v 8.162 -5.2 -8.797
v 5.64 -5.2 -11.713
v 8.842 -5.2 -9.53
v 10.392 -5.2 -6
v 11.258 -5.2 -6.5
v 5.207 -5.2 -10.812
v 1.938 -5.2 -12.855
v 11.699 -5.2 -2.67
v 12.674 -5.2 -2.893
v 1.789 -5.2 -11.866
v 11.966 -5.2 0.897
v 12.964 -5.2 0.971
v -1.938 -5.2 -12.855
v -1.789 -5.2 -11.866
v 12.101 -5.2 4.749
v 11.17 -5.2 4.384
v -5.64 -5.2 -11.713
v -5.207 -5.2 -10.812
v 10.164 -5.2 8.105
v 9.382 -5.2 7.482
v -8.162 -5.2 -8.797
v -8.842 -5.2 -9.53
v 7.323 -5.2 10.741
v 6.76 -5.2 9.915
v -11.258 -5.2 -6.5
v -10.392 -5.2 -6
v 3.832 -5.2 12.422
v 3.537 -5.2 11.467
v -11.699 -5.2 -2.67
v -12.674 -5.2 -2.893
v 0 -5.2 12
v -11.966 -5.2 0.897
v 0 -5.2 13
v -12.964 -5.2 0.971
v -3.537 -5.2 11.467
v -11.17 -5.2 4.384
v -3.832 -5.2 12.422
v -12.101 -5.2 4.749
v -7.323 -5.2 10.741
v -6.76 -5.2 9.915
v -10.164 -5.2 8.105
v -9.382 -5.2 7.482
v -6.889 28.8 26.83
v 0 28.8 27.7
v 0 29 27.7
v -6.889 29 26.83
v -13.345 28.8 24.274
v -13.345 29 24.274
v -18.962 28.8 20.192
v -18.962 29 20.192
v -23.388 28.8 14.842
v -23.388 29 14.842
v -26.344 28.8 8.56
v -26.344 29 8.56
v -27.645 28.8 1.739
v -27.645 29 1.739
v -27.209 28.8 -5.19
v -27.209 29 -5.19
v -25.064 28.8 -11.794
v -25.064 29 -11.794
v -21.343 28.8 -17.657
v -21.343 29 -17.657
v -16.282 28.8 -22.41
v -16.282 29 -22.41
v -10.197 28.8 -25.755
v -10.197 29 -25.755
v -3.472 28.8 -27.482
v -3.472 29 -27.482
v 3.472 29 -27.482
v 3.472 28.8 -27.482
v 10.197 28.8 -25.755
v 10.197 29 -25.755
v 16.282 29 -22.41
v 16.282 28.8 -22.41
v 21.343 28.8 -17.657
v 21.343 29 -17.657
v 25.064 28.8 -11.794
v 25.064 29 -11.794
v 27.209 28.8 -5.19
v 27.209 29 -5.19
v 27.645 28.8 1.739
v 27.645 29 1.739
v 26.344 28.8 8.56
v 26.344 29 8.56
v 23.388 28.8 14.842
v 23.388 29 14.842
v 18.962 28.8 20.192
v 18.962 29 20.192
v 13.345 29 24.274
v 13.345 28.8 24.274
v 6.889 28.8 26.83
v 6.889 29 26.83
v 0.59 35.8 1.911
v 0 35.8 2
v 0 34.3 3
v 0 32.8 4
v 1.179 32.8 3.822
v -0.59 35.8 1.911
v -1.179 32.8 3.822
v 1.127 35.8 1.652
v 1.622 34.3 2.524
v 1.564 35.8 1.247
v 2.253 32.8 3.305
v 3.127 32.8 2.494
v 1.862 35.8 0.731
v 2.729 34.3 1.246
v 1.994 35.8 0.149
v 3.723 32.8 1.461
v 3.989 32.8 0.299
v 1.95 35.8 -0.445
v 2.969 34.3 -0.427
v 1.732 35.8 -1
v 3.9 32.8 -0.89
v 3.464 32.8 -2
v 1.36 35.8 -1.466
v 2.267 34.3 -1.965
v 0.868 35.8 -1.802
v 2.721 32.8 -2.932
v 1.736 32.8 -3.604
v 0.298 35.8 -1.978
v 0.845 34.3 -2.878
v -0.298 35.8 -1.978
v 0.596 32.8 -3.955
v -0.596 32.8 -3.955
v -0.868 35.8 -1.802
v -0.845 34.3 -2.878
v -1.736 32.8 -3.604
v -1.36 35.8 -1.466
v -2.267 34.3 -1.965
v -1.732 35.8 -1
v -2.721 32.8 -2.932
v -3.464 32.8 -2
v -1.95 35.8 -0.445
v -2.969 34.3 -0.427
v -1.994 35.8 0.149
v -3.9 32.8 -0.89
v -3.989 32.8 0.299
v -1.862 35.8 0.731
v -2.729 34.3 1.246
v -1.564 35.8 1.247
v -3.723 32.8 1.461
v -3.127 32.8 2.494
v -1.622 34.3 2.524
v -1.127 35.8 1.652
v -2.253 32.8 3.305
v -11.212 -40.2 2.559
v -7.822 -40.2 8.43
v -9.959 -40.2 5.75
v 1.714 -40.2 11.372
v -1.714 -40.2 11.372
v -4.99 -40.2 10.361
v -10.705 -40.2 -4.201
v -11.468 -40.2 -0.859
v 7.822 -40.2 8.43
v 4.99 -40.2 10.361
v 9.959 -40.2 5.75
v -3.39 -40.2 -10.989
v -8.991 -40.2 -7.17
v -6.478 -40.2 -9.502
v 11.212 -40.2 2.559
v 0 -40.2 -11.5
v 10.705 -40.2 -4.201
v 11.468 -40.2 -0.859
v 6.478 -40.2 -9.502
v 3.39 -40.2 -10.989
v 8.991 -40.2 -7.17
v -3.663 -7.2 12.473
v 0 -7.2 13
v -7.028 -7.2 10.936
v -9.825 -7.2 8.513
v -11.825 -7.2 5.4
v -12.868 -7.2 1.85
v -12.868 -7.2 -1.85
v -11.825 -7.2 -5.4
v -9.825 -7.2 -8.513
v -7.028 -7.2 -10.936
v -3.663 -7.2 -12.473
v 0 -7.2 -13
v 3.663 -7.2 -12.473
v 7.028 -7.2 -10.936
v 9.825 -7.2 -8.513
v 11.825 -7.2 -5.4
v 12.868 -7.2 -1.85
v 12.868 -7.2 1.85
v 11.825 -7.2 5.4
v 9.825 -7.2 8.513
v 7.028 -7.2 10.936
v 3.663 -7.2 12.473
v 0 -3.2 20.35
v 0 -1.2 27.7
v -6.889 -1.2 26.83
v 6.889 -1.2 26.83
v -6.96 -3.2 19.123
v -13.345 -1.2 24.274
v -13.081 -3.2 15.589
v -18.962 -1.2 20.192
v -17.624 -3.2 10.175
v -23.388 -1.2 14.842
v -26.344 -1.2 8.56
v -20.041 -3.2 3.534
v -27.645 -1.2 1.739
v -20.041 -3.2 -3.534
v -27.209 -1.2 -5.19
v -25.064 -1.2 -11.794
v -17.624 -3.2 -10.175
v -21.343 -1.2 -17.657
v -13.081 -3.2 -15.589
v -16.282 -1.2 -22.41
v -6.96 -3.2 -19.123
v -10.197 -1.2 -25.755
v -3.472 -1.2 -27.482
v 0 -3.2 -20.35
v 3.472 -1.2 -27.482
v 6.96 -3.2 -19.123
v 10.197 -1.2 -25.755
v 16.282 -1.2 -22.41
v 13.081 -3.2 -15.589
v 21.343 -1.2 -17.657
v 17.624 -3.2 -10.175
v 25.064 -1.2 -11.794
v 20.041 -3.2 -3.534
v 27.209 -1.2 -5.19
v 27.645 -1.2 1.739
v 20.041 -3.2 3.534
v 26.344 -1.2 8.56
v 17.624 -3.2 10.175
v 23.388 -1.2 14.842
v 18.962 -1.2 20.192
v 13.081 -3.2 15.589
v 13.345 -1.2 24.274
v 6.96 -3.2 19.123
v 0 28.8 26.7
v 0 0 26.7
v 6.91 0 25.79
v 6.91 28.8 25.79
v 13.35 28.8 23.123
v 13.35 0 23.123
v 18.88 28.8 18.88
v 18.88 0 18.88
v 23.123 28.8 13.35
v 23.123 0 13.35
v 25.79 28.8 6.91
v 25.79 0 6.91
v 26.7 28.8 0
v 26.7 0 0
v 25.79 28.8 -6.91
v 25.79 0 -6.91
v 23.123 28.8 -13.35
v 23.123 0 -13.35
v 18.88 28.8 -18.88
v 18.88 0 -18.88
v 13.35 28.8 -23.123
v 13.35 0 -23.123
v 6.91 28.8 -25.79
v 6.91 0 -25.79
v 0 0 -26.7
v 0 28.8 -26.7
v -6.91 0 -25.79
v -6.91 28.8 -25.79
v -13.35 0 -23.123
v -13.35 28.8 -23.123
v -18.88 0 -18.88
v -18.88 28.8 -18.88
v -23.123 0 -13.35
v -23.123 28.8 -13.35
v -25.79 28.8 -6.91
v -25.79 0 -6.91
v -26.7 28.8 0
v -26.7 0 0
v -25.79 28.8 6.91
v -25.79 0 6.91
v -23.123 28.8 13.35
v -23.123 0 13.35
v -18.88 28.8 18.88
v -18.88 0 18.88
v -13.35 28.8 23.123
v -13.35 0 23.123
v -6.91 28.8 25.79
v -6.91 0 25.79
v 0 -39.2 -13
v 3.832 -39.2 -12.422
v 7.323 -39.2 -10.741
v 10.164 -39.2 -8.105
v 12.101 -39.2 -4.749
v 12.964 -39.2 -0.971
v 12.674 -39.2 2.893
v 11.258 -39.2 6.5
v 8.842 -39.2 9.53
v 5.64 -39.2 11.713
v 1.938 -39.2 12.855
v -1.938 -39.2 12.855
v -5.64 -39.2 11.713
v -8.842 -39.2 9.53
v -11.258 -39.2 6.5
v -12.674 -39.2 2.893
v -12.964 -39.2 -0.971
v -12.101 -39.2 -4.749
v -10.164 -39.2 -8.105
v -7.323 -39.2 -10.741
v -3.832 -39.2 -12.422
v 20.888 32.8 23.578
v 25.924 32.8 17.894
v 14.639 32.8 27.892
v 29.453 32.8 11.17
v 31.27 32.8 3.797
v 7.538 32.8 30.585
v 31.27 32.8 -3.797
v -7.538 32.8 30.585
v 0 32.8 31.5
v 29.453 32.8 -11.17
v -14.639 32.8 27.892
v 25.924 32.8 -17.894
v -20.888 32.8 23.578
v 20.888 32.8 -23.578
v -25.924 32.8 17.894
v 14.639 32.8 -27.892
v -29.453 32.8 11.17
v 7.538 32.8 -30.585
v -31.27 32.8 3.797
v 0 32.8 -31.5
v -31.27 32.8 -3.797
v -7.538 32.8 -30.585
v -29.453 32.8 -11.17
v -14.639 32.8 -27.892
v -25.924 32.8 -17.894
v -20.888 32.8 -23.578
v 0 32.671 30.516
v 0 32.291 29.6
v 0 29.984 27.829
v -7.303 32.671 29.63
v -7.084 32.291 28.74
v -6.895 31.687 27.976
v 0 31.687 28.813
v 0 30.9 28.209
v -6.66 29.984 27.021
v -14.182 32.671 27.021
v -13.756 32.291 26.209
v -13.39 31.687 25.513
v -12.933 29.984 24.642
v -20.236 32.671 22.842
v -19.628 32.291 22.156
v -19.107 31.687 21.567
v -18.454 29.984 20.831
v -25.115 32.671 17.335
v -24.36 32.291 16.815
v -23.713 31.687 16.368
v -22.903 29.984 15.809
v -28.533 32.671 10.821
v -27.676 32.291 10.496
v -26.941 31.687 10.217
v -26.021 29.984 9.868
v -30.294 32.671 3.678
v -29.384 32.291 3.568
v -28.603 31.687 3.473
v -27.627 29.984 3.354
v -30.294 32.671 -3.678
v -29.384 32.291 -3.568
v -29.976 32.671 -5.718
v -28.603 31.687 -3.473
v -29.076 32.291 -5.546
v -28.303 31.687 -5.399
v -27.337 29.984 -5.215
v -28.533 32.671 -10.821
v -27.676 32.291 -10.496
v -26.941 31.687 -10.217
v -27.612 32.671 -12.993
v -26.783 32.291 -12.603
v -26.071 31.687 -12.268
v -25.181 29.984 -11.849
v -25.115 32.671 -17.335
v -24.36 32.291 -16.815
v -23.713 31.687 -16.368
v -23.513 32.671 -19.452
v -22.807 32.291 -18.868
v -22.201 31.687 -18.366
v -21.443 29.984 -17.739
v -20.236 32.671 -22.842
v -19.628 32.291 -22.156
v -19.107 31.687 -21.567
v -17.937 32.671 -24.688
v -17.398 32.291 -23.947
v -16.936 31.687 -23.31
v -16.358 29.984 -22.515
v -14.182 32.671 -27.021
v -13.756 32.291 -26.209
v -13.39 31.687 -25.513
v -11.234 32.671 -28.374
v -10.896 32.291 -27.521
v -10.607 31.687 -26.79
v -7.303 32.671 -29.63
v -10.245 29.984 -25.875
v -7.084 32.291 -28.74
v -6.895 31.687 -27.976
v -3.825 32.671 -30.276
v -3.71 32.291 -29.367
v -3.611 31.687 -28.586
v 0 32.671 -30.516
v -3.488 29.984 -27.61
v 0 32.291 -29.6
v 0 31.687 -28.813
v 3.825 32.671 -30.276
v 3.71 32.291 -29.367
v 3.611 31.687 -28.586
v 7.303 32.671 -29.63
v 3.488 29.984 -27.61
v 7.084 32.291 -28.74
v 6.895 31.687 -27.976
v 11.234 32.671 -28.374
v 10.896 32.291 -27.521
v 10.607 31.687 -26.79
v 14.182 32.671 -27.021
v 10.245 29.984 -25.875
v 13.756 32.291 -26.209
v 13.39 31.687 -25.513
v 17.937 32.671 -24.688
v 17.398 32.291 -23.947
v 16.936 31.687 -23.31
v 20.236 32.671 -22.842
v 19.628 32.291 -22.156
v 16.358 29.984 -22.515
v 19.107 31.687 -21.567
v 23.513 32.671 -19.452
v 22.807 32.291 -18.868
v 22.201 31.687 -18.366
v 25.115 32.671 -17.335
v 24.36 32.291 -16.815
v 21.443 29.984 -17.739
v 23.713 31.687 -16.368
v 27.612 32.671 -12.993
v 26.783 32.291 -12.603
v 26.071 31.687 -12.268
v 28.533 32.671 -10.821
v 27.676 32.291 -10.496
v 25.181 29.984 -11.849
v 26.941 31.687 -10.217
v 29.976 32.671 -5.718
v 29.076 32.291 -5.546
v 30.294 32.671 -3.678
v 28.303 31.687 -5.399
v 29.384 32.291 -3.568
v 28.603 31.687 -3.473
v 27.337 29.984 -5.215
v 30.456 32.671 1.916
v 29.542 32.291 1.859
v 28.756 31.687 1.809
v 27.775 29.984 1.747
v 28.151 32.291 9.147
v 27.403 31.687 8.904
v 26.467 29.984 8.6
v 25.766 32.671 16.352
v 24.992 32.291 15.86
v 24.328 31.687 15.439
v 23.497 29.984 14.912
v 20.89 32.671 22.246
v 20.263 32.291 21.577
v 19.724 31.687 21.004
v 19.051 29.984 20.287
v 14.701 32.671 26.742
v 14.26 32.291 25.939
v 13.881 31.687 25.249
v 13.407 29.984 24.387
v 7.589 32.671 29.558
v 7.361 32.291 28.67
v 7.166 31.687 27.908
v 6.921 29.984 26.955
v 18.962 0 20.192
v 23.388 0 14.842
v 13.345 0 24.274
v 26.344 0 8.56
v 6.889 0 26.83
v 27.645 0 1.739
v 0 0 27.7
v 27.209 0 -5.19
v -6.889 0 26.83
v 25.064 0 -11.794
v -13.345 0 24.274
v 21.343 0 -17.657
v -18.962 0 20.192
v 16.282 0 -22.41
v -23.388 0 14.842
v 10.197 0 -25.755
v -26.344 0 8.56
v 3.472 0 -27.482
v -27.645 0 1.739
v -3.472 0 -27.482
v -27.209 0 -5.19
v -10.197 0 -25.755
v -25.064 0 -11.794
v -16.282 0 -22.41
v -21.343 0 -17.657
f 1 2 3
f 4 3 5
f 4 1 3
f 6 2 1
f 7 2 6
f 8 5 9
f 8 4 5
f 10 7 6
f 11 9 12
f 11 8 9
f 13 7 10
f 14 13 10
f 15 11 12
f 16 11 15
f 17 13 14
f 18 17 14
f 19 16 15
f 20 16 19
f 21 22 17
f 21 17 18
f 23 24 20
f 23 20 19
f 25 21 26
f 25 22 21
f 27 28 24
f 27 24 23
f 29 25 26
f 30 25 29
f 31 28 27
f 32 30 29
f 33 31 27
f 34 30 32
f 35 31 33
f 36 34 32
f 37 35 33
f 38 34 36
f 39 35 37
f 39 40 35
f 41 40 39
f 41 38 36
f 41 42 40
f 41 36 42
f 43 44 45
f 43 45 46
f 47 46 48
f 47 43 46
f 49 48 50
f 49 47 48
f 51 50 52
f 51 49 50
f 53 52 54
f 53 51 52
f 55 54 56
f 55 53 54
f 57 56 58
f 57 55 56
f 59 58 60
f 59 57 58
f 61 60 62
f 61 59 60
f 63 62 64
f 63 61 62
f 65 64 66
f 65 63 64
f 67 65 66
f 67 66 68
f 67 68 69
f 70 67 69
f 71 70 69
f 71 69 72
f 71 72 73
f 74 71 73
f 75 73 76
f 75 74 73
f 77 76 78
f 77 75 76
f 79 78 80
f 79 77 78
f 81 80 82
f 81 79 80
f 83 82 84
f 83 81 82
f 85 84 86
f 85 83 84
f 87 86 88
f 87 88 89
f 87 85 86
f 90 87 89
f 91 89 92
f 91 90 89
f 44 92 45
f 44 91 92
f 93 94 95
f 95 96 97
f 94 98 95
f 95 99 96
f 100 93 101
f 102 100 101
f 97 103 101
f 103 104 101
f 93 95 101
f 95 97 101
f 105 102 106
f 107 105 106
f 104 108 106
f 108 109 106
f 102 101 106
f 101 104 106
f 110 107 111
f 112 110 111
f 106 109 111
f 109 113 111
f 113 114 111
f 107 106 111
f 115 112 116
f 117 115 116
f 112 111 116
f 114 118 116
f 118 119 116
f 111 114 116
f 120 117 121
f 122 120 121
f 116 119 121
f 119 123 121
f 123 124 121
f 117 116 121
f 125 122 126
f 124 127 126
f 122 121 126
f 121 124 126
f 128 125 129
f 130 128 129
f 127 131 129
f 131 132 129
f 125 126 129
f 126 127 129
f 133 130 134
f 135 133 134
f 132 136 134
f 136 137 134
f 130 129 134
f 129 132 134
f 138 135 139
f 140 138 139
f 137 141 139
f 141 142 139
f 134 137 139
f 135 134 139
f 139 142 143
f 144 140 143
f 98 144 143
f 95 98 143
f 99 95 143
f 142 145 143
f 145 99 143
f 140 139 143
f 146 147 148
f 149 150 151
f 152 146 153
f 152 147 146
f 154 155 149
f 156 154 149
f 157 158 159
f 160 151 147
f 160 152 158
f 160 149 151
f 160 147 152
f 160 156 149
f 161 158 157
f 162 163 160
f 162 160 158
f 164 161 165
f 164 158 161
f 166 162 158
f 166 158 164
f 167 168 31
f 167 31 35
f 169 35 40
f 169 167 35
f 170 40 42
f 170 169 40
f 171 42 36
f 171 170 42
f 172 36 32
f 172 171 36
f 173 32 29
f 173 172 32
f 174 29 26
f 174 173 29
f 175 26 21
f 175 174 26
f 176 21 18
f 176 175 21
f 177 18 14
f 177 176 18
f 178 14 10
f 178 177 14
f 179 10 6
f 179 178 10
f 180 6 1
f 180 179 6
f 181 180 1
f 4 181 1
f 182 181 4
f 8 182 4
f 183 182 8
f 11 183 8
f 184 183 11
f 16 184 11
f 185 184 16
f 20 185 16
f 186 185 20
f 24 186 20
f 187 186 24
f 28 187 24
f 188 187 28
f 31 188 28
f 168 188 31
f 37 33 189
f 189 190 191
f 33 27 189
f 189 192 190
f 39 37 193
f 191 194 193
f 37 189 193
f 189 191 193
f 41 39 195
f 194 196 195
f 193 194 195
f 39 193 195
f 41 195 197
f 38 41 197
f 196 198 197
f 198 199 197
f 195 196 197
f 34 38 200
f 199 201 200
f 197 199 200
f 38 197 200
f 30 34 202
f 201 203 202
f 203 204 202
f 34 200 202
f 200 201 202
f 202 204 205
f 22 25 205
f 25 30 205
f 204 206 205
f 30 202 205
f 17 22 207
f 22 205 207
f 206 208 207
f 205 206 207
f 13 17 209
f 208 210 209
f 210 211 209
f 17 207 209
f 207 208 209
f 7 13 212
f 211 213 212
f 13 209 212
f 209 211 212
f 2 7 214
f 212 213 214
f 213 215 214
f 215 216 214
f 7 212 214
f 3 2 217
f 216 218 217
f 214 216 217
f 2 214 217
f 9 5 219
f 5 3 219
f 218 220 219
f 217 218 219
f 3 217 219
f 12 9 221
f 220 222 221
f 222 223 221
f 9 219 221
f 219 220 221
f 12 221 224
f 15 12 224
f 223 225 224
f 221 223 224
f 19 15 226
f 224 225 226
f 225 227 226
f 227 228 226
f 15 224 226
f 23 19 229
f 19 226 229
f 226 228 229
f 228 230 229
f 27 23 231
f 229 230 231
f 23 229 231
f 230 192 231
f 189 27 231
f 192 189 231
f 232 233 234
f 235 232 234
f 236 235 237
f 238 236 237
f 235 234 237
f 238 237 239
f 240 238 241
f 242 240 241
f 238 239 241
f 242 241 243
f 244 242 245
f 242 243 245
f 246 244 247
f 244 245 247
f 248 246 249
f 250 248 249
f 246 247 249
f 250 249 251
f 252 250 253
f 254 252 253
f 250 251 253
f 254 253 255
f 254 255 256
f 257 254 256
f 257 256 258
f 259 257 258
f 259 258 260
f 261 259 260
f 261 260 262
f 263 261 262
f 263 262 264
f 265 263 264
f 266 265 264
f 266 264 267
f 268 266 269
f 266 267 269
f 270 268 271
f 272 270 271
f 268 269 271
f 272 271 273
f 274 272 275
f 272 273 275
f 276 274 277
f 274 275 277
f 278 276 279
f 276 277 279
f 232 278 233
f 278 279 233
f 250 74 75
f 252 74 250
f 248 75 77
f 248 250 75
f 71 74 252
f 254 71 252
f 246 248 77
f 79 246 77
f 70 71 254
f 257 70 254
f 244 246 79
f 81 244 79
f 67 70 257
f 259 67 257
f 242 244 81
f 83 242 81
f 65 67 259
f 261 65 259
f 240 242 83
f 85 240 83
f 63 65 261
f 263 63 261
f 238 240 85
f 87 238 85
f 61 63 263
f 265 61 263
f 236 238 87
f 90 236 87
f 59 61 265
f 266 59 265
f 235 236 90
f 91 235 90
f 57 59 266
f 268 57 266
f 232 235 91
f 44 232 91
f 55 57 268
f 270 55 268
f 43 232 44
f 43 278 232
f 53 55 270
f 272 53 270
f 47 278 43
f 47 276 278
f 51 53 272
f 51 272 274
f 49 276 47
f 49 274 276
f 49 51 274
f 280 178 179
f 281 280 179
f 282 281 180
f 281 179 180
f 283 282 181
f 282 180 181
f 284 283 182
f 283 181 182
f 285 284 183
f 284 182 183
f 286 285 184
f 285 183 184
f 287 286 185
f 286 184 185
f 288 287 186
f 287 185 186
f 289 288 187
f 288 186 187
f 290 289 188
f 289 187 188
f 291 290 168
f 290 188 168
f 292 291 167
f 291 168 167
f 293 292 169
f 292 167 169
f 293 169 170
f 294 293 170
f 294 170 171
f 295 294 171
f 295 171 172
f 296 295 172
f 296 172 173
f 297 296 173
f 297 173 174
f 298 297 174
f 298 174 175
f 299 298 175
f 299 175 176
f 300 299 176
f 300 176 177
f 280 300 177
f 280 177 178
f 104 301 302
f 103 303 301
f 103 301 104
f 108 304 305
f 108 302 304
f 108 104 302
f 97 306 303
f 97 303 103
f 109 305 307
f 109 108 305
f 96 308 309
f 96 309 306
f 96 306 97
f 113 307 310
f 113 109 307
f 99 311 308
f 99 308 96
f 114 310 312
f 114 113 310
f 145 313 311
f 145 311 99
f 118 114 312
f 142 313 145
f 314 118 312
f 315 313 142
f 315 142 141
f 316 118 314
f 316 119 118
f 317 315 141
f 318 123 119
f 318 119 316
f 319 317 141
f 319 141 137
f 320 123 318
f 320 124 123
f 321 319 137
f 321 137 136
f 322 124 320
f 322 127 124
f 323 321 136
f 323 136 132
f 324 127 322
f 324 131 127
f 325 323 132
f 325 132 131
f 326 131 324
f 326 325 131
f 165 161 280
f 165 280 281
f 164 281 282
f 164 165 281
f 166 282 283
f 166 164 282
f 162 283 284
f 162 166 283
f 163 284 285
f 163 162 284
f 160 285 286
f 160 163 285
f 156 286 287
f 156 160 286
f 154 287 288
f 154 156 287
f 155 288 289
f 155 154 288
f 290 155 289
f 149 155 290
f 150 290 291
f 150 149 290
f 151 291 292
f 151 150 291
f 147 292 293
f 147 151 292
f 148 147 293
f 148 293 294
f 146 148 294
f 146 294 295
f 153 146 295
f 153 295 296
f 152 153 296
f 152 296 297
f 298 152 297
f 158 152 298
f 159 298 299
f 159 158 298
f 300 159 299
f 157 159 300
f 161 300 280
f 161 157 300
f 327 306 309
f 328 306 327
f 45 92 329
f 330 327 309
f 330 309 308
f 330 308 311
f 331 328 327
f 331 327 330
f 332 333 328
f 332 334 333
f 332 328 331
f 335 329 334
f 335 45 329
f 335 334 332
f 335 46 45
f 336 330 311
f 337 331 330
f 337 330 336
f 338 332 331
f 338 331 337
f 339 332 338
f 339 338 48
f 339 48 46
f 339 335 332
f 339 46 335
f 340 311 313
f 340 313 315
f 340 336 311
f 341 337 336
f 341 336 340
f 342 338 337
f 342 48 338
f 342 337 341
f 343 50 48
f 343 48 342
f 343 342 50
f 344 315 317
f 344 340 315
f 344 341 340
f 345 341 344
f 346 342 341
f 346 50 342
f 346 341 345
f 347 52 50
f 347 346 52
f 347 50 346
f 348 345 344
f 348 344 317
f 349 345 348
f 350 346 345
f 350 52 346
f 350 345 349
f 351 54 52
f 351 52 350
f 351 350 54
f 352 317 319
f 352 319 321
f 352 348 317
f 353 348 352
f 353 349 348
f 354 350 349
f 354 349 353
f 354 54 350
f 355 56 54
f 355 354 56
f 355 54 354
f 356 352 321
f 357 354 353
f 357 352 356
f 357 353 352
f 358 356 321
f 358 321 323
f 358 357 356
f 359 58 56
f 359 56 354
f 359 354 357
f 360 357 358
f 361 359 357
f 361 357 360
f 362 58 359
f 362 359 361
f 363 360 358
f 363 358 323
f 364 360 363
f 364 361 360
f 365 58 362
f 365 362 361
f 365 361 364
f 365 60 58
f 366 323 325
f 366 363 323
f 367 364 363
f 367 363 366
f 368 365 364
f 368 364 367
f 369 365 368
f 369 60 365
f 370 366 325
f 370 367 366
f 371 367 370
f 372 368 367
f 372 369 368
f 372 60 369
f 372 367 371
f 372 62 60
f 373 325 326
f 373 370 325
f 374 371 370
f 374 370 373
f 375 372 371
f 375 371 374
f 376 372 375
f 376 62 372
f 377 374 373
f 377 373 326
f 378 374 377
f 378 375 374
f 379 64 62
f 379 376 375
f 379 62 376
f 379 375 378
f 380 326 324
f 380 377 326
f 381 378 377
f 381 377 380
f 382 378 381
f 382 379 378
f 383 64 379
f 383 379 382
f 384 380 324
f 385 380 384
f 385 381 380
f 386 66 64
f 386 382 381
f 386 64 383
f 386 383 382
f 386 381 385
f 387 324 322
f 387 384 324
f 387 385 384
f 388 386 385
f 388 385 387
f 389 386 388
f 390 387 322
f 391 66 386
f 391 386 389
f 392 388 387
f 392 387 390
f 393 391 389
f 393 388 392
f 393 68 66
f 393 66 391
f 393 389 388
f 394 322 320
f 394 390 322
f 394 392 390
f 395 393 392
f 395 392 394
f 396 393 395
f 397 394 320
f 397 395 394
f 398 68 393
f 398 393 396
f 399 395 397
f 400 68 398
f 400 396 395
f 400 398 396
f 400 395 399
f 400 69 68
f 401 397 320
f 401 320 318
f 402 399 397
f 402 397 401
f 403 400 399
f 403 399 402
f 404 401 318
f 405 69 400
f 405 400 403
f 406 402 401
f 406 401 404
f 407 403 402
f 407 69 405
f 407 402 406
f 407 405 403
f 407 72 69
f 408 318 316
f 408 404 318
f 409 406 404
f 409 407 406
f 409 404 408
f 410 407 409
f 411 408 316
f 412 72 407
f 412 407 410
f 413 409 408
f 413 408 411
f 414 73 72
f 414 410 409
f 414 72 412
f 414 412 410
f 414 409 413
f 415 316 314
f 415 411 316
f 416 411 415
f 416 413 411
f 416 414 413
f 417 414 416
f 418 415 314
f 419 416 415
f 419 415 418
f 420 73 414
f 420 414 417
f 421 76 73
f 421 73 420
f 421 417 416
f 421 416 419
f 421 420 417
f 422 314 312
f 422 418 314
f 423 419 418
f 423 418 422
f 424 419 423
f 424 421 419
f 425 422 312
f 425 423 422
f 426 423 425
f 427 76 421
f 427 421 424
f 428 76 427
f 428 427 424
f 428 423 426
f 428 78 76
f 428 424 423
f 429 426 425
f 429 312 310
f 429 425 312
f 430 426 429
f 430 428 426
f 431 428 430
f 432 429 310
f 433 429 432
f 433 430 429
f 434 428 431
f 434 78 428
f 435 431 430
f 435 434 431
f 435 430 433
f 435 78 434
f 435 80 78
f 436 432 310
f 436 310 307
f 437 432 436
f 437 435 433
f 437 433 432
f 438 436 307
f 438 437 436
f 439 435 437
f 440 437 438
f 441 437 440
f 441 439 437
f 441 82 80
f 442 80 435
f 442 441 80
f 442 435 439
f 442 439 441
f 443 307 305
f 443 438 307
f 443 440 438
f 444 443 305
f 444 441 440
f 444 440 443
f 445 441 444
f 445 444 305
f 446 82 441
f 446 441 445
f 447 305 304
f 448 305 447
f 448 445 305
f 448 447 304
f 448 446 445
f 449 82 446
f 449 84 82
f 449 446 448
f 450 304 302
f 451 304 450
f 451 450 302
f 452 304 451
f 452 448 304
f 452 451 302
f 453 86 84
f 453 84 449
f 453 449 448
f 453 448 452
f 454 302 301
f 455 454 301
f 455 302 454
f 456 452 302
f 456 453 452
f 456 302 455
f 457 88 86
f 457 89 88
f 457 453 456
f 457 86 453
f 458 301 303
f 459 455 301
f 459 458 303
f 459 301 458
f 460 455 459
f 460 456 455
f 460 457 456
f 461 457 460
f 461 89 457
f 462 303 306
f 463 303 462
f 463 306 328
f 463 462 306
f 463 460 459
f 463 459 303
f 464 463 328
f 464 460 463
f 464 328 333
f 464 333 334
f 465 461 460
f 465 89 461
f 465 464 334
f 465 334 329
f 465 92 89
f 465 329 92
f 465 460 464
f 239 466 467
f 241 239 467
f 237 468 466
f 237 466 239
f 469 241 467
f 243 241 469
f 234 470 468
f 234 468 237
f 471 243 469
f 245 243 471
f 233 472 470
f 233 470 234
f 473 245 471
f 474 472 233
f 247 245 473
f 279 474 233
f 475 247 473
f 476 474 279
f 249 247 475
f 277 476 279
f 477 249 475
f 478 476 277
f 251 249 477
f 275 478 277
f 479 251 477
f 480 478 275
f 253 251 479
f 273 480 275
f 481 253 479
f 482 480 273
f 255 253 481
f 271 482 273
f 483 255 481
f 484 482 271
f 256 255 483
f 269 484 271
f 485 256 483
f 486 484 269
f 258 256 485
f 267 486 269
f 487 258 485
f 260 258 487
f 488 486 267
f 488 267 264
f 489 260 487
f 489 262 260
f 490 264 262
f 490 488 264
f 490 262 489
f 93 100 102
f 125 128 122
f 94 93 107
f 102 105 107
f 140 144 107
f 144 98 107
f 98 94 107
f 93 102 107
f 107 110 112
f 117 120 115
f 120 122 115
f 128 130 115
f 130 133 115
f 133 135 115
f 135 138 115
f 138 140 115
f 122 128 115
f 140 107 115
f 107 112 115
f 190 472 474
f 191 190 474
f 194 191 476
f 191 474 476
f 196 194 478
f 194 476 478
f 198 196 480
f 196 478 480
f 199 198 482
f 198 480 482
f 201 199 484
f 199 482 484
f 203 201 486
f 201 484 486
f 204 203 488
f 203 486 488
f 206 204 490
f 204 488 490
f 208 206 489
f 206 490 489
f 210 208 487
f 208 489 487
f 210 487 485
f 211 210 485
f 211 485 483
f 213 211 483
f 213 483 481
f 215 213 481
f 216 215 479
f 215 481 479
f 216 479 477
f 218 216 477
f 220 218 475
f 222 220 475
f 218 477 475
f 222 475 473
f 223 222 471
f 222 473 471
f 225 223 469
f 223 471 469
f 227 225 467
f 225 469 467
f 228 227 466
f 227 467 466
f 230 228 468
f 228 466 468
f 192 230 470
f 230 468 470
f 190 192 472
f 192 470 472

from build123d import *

# Parameters (mm, degrees)
SKETCH_1_R      = 26.7
EXTRUDE_1_DEPTH = 28.8
SKETCH_4_R      = 13
EXTRUDE_2_DEPTH = 39
CHAMFER_1_SIZE  = 1
CHAMFER_1_SIZE2 = 1.5


with BuildPart() as part:
    # 草图1 → 凸台-拉伸1 (new body)
    with BuildSketch(Plane(origin=(0, 0, 0), x_dir=(1, 0, 0), z_dir=(0, 1, 0))):
        Circle(SKETCH_1_R)
    extrude(amount=EXTRUDE_1_DEPTH)

    # 草图2 → 旋转1 (revolve)
    with BuildSketch(Plane.XY):
        Polygon((-27.7, 28.8), (-26.7, 28.8), (0, 28.8), (0, 29), (-27.7, 29), align=None)
    revolve(axis=Axis((0, 37.25413602, 0), (0, -1, 0)))

    # 草图2<3> → 旋转2 (revolve)
    with BuildSketch(Plane.XY):
        with BuildLine():
            ThreePointArc((-31.5, 32.8), (-28.812994231, 31.687005769), (-27.7, 29))
            Line((-27.7, 29), (0, 29))
            Line((0, 29), (0, 32.8))
            Line((0, 32.8), (-31.5, 32.8))
        make_face()
    revolve(axis=Axis((0, 37.25413602, 0), (0, -1, 0)))

    # 草图3 → 旋转3 (revolve)
    with BuildSketch(Plane.XY):
        Polygon((-27.7, 0), (-26.7, 0), (0, 0), (0, -1.2), (-27.7, -1.2), align=None)
    revolve(axis=Axis((0, 9.532579507, 0), (0, -1, 0)))

    # 草图4 → 凸台-拉伸2 (add)
    with BuildSketch(Plane.XZ.offset(1.2)):
        Circle(SKETCH_4_R)
    extrude(amount=EXTRUDE_2_DEPTH)

    # 倒角1
    chamfer_1_edges = [part.edges().sort_by_distance(p)[0] for p in [
        (-13, -40.2, 0),
    ]]
    chamfer_1_side = [part.faces().sort_by_distance(p)[0] for p in [
        (-13, -20.7, 0),
    ]]
    chamfer(chamfer_1_edges, length=CHAMFER_1_SIZE, length2=CHAMFER_1_SIZE2, reference=chamfer_1_side[0])

    # 草图6 → 旋转4 (revolve)
    with BuildSketch(Plane.XY):
        Polygon((-13, -1.2), (-13, -5.2), (-27.7, -1.2), align=None)
    revolve(axis=Axis((0, 5.765222619, 0), (0, -1, 0)))

    # 草图7 → 切除-旋转1 (revolve, cut)
    with BuildSketch(Plane.XY):
        Polygon((-13, -5.2), (-12, -5.2), (-13, -7.2), align=None)
    revolve(axis=Axis((0, -1.925824923, 0), (0, -1, 0)), mode=Mode.SUBTRACT)

    # 草图8 → 旋转5 (revolve)
    with BuildSketch(Plane.XY):
        Polygon((0, 32.8), (0, 35.8), (-2, 35.8), (-4, 32.8), align=None)
    revolve(axis=Axis((0, 18.882882331, 0), (0, 1, 0)))


solid = part.part
